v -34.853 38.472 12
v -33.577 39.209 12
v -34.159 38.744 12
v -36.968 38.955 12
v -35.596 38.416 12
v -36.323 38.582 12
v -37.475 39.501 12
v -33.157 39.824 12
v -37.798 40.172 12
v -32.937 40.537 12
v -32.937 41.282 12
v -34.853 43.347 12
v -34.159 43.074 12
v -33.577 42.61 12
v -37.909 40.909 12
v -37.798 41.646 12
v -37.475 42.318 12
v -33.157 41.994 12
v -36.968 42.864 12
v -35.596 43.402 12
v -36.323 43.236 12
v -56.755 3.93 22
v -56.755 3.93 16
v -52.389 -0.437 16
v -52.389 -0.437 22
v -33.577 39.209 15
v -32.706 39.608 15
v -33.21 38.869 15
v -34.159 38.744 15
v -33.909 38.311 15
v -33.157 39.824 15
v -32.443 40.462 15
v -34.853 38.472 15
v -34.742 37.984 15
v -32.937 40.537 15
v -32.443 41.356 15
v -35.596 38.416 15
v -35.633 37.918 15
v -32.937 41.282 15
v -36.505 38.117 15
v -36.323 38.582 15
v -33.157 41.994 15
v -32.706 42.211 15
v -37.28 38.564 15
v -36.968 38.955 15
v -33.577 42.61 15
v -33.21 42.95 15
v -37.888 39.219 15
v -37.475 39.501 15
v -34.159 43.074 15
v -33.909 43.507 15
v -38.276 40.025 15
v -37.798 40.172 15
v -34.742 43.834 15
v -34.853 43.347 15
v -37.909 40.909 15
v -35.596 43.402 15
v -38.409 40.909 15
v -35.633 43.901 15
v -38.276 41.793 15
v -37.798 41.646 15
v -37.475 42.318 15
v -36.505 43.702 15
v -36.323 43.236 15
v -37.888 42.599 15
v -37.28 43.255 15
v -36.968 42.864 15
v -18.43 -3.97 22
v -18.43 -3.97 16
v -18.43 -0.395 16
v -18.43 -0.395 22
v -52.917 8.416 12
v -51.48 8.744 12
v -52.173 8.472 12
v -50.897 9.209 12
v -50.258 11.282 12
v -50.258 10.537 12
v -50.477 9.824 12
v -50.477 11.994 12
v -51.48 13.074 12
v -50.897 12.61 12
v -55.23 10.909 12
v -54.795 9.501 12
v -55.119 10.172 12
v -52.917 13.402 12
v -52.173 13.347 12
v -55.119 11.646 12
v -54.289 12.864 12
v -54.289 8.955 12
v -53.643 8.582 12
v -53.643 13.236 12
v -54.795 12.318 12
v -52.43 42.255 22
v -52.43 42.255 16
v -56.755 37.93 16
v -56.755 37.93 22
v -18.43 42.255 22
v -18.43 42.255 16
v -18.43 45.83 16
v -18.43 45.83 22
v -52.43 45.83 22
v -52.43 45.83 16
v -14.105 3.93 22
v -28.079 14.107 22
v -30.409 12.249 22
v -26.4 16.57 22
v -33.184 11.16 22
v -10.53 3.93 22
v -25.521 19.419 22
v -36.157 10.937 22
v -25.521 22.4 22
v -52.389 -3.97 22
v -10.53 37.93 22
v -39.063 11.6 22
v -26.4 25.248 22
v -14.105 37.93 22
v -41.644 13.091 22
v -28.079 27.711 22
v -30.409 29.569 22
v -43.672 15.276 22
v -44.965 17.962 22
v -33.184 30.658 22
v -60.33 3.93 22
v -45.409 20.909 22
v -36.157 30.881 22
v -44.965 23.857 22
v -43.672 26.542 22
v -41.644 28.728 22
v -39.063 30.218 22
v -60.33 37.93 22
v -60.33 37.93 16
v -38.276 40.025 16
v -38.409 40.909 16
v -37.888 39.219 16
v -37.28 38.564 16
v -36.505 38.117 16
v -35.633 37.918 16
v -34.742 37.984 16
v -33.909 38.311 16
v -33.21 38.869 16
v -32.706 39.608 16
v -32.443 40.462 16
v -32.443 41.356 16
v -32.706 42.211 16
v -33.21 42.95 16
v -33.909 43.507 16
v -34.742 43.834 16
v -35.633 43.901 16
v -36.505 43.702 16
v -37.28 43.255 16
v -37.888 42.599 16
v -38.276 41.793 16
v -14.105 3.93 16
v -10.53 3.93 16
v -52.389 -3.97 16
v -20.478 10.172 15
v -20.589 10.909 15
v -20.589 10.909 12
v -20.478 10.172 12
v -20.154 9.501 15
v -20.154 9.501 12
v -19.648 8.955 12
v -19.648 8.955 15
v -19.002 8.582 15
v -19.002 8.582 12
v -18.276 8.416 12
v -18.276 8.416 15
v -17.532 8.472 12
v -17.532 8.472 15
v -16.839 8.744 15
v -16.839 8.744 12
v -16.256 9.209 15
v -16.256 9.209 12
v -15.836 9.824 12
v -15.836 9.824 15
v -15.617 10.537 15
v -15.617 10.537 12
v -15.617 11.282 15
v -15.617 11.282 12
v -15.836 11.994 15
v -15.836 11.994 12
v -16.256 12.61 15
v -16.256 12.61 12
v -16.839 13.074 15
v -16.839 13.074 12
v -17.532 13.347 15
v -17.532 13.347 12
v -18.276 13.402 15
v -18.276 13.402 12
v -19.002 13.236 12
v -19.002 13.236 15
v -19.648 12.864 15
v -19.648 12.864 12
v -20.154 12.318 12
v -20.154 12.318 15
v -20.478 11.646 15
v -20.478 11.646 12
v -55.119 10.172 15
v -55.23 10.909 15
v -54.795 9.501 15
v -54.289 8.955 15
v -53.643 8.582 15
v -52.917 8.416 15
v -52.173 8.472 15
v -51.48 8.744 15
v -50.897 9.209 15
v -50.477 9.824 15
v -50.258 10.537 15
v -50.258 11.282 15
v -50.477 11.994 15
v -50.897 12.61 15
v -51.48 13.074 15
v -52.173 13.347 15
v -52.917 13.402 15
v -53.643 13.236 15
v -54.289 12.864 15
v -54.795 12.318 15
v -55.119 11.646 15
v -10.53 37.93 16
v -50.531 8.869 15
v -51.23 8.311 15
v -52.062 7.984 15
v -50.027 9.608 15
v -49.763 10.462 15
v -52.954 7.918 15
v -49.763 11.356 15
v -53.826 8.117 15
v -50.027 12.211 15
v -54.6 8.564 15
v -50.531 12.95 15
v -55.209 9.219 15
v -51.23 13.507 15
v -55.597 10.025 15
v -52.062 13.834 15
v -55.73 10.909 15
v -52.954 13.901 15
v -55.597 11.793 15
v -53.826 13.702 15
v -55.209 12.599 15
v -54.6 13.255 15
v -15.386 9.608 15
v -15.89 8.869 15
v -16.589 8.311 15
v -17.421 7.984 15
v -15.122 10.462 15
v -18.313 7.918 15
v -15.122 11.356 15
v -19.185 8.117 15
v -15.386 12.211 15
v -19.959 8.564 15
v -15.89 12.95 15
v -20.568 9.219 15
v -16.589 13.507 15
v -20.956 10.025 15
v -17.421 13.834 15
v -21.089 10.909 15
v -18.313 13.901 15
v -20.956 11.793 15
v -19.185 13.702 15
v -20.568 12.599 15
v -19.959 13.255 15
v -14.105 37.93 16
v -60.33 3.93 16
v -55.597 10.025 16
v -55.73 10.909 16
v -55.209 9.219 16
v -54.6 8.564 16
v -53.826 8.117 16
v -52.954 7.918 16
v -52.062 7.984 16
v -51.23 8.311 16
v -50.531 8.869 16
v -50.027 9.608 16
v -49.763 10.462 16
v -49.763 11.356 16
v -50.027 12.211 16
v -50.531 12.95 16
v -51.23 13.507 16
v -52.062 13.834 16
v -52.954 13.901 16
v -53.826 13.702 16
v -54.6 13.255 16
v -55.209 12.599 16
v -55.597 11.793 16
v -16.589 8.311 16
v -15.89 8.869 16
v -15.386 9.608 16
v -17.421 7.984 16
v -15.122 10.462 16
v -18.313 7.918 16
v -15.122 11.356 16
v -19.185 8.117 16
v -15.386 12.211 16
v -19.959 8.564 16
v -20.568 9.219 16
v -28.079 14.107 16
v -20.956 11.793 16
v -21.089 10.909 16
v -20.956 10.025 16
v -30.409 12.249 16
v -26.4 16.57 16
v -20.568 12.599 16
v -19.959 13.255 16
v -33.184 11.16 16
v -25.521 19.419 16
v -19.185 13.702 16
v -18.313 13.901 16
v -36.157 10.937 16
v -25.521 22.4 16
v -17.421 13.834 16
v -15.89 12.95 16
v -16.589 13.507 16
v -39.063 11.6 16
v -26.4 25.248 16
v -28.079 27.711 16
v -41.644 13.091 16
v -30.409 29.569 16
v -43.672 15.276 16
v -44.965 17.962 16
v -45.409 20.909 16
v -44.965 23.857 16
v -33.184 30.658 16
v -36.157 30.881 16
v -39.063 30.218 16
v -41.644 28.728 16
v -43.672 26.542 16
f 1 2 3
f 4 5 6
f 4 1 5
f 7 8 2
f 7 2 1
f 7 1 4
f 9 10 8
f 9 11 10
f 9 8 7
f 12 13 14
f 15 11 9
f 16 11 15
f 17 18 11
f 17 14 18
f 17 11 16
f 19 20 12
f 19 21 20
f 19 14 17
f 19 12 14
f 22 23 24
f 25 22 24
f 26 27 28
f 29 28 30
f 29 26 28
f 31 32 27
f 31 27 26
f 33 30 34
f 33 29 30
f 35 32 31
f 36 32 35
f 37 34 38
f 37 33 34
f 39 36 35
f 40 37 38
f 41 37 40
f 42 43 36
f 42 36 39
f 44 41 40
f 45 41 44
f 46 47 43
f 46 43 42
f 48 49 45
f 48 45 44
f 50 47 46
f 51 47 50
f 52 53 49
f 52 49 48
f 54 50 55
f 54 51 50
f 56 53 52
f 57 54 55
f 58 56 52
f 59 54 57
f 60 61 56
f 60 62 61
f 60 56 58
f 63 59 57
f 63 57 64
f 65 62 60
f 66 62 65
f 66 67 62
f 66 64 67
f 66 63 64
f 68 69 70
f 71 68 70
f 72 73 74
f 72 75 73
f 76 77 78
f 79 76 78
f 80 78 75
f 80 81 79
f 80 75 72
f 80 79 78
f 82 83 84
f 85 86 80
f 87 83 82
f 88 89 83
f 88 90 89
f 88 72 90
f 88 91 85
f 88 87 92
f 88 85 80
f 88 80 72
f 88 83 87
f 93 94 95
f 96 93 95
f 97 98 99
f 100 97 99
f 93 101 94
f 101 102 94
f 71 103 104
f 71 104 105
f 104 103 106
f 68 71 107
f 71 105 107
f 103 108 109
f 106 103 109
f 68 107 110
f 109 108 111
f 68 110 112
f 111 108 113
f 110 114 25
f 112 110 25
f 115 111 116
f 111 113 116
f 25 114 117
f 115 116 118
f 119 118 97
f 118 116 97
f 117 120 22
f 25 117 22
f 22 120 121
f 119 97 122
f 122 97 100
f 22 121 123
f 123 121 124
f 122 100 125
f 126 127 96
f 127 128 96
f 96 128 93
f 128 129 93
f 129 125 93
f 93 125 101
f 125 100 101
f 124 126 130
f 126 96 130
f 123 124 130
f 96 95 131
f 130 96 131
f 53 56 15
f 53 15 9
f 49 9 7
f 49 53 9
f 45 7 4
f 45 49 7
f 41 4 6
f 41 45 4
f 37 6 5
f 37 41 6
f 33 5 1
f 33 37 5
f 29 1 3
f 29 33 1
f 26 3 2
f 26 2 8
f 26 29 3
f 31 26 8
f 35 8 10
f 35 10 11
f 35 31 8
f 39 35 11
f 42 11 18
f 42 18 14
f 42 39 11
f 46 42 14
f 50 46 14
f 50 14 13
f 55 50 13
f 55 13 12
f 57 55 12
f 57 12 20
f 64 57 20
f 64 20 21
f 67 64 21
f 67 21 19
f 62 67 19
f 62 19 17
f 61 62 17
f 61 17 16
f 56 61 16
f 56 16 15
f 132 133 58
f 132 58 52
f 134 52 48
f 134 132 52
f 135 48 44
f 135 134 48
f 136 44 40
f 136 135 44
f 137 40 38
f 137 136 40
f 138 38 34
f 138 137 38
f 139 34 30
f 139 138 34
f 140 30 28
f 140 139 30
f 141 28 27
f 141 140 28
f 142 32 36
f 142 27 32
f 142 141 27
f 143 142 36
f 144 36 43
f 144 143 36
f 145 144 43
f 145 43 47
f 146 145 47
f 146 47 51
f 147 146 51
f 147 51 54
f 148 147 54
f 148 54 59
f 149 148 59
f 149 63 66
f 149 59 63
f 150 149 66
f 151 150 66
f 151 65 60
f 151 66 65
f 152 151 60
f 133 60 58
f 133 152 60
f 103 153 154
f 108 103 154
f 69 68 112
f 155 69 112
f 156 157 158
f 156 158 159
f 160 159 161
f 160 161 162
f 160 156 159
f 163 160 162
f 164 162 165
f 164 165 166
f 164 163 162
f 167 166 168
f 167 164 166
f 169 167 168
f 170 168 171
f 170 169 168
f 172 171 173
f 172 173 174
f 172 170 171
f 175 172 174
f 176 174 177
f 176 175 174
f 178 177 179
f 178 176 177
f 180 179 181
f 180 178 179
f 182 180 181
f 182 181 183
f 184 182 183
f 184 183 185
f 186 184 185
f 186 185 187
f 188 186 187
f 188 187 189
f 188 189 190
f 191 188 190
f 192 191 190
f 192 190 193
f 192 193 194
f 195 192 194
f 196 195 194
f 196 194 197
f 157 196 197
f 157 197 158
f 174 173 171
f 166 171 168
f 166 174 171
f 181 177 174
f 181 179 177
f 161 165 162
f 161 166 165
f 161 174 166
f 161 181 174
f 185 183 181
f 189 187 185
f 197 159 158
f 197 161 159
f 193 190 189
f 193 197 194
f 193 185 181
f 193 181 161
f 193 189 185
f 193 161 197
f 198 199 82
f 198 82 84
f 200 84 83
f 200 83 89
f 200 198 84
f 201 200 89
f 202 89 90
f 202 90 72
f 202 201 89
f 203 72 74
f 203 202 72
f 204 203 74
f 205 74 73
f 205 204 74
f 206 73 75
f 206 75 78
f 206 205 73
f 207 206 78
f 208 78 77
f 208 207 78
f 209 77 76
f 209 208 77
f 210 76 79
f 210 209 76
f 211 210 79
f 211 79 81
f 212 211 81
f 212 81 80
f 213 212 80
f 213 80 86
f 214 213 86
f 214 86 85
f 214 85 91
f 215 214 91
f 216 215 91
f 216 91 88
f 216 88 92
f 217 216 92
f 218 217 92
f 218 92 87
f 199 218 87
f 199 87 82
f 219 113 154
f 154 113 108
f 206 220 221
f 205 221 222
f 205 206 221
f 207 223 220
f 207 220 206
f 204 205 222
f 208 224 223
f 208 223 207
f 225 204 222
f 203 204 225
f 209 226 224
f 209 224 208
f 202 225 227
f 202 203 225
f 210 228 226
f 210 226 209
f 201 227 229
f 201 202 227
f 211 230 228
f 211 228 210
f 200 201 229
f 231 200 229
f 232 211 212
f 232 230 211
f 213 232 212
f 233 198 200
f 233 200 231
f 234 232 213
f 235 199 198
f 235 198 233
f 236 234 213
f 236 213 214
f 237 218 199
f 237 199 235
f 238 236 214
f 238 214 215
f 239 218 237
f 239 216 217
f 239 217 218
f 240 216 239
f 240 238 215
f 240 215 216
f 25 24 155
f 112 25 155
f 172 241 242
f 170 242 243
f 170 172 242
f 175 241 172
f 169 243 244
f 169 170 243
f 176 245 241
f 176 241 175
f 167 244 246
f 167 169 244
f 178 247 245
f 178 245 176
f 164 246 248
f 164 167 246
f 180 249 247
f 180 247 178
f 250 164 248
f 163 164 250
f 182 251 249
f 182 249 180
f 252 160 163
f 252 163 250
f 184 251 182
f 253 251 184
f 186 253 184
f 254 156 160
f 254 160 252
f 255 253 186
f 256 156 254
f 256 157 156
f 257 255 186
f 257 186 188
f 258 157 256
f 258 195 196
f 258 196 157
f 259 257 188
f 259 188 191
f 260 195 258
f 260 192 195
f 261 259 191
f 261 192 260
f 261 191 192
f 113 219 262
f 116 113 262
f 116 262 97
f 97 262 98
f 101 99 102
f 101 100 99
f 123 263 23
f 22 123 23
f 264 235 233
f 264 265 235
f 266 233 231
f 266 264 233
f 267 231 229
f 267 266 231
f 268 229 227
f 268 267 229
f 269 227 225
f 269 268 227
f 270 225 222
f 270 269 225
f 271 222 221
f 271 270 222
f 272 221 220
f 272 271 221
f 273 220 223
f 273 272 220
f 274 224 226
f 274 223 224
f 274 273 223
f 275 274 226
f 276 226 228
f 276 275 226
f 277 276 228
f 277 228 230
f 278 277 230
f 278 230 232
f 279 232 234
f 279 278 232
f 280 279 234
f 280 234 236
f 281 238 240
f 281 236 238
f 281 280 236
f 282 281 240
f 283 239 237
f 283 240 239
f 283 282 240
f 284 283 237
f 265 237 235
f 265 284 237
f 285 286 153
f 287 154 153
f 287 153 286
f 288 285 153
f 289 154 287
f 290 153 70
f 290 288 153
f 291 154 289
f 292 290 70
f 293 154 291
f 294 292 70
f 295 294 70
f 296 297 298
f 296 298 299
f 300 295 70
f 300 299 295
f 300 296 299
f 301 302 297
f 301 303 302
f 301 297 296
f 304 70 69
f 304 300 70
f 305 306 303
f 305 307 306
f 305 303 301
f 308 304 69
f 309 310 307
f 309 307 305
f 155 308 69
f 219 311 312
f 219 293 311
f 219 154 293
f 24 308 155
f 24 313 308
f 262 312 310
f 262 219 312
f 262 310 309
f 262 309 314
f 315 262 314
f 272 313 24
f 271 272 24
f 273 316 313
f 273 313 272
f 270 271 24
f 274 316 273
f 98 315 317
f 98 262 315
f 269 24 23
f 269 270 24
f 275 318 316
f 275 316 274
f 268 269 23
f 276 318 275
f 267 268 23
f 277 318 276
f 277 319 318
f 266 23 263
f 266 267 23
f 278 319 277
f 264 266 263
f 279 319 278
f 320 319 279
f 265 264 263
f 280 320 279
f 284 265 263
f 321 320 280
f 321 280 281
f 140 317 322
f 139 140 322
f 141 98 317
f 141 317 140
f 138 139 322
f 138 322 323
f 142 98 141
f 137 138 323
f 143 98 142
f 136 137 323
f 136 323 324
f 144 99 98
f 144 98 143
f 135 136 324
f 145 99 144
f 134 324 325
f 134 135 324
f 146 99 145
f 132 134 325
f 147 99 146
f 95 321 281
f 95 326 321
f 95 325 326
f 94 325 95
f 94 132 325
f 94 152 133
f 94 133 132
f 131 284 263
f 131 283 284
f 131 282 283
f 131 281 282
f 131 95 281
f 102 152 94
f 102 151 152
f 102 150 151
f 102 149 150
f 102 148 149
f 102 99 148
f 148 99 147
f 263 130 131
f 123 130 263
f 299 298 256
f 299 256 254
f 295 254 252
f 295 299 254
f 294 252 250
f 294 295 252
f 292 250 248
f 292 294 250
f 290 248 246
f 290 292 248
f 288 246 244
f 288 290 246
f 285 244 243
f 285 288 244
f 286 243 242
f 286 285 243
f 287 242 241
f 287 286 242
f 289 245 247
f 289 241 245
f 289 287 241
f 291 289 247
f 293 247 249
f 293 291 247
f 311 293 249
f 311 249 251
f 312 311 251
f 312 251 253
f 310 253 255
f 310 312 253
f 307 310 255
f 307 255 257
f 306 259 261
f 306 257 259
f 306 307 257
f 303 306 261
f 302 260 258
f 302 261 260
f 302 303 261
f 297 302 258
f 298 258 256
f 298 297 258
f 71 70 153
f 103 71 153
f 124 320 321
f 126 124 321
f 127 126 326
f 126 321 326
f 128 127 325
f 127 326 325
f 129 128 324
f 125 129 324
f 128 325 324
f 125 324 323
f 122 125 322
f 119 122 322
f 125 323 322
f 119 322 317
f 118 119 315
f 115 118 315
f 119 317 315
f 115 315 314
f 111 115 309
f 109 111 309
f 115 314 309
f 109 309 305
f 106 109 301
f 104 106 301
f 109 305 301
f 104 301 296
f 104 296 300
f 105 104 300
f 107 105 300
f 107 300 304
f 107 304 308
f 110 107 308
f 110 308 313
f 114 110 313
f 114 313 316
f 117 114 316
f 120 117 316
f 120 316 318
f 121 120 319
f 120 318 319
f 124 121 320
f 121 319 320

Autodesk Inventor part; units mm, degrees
ref_plane "YZ Plane" through (0, 0, 0) normal (1, 0, 0) x (0, 1, 0)
ref_plane "XZ Plane" through (0, 0, 0) normal (0, 1, 0) x (-1, 0, 0)
ref_plane "Work Plane1" through (-56.3599, 0, 22) normal (0, 0, -1) x (-1, 0, 0)
sketch "Sketch1" plane through (-56.3599, 0, 22) normal (0, 0, -1) x (-1, 0, 0)
  line L0 (-4.0299, -0.3538) -> (-2.2322, 1.4439) construction
  arc A0 (-1.4439, 2.2322) -> (-2.2322, 1.4439) centre (-0.9299, 0.9299) ccw construction
  line L1 (-1.4439, 2.2322) -> (0.3538, 4.0299) construction
  line L2 (-37.8299, 42.8299) -> (-37.8299, 37.8299) construction
  line L3 (-37.8299, 37.8299) -> (-42.9208, 37.8299) construction
  line L4 (-37.8299, 42.2137) -> (-37.8299, 45.8299) construction
  line L5 (-37.8299, 45.8299) -> (-4.0299, 45.8299) construction
  line L6 (-4.0299, 45.8299) -> (-4.0299, 42.2137) construction
  line L7 (-4.0299, 4.0299) -> (0.3538, 4.0299) projected
  circle A1 centre (-20.9299, 20.9299) radius 17.5 projected
  line L8 (-20.9299, 58.9723) -> (17.1124, 20.9299) construction
  line L9 (17.1124, 20.9299) -> (-20.9299, -17.1124) construction
  line L10 (-20.9299, -17.1124) -> (-58.9723, 20.9299) construction
  line L11 (-58.9723, 20.9299) -> (-20.9299, 58.9723) construction
  line L12 (-20.9299, 58.9723) -> (-20.9299, -17.1124) construction
  line L13 (17.1124, 20.9299) -> (-58.9723, 20.9299) construction
  line L14 (-20.9299, 58.9723) -> (32.8701, 58.9723) construction
  line L15 (-43.4299, 43.4299) -> (1.5701, 43.4299) construction
  line L16 (1.5701, 43.4299) -> (1.5701, -1.5701) construction
  line L17 (1.5701, -1.5701) -> (-43.4299, -1.5701) construction
  line L18 (-43.4299, -1.5701) -> (-43.4299, 43.4299) construction
  line L19 (-43.4299, 43.4299) -> (1.5701, -1.5701) construction
  line L20 (1.5701, 43.4299) -> (-43.4299, -1.5701) construction
  line L21 (-43.4299, 5.3876) -> (-43.4299, 36.4723)
  line L22 (-43.4299, 36.4723) -> (-36.4723, 43.4299)
  line L23 (-36.4723, 43.4299) -> (-5.3876, 43.4299)
  line L24 (-5.3876, 43.4299) -> (1.5701, 36.4723)
  line L25 (1.5701, 36.4723) -> (1.5701, 5.3876)
  line L26 (1.5701, 5.3876) -> (-5.3876, -1.5701)
  line L27 (-5.3876, -1.5701) -> (-36.4723, -1.5701)
  line L28 (-36.4723, -1.5701) -> (-43.4299, 5.3876)
  line L29 (-4.0299, 42.2137) -> (-37.8299, 42.2137) projected
  line L30 (-4.0299, -0.3538) -> (-4.0299, 4.0299) projected
  circle A2 centre (-20.9299, 20.9299) radius 1.5
  line L31 (-10.9299, 10.9299) -> (-30.9299, 10.9299) construction
  line L32 (-30.9299, 10.9299) -> (-30.9299, 30.9299) construction
  line L33 (-30.9299, 30.9299) -> (-10.9299, 30.9299) construction
  line L34 (-10.9299, 30.9299) -> (-10.9299, 10.9299) construction
  line L35 (-10.9299, 10.9299) -> (-30.9299, 30.9299) construction
  line L36 (-30.9299, 10.9299) -> (-10.9299, 30.9299) construction
  circle A3 centre (-30.9299, 30.9299) radius 1.4
  circle A4 centre (-30.9299, 10.9299) radius 1.4
  circle A5 centre (-10.9299, 10.9299) radius 1.4
  line L37 (-45.8299, 37.8299) -> (-42.0723, 37.8299) construction
  line L38 (-42.1723, 37.7299) -> (-45.8299, 37.7299)
  line L39 (-45.8299, 37.7299) -> (-45.8299, 4.1299)
  line L40 (-45.8299, 4.1299) -> (-42.1723, 4.1299)
  line L41 (-42.1723, 4.1299) -> (-42.1723, 37.7299)
  line L42 (-45.8299, 4.0299) -> (-42.0723, 4.0299) construction
  line L43 (-45.8299, 37.8299) -> (-42.0723, 37.8299) projected
  line L44 (-37.7299, 45.8299) -> (-4.1299, 45.8299)
  line L45 (-4.1299, 45.8299) -> (-4.1299, 42.1723)
  line L46 (-4.1299, 42.1723) -> (-37.7299, 42.1723)
  line L47 (-37.7299, 42.1723) -> (-37.7299, 45.8299)
  line L48 (0.4701, 37.8299) -> (0.4701, 4.0299) construction
  line L49 (0.4701, 4.0299) -> (3.9701, 4.0299) construction
  line L50 (3.9701, 37.8299) -> (3.9701, 4.0299) construction
  line L51 (0.4701, 37.8299) -> (3.9701, 37.8299) construction
  line L52 (-45.8299, -3.9701) -> (-4.0299, -3.9701) construction
  line L53 (0.3124, 37.7299) -> (3.9701, 37.7299)
  line L54 (3.9701, 37.7299) -> (3.9701, 4.1299)
  line L55 (3.9701, 4.1299) -> (0.3124, 4.1299)
  line L56 (0.3124, 4.1299) -> (0.3124, 37.7299)
  line L57 (-4.1713, -0.3538) -> (-37.7299, -0.3538)
  line L58 (-37.7299, -0.3538) -> (-37.7299, -3.9701)
  line L59 (-37.7299, -3.9701) -> (-4.1713, -3.9701)
  line L60 (-4.1713, -3.9701) -> (-4.1713, -0.3538)
  point P0 (-37.8299, 4.0299)
  dimension "d18" = 53.8
  dimension "d19" = 45
  dimension "d20" = 53.8
  dimension "d21" = 45
  dimension "d22" = 45
  dimension "d30" = 20
  dimension "d31" = 20
  dimension "d32" = 2.8
  dimension "d33" = 2.8
  dimension "d34" = 2.8
  dimension "d35" = 3
  dimension "d36" = 0.1
  dimension "d37" = 0.1
  dimension "d38" = 0.1
  dimension "d39" = 0.1
extrude "Extrusion1" add sketch "Sketch1" along normal blind 6 contours L30 L26 L57 L28 L41 L22 L46 L24 L56 L7 | L7 L26 L30 | L56 L24 L25 L26 | L26 L25 L24 L53 L54 L55 | L60 L59 L58 L57 L28 L27 L26 | L26 L27 L28 L57 | L46 L22 L29 L24 | L24 L29 L45 | L40 L39 L38 L22 L21 L28 | L28 L21 L22 L41 | L29 L22 L23 L24 | L24 L23 L22 L29 L47 L44 L45 | L47 L29 L22 | A1 | A2 | A3 | A4 | A5
sketch "Skizze4" plane through (-56.3599, 0, 16) normal (0, 0, -1) x (-1, 0, 0)
  line L0 (-37.7299, 42.1723) -> (-42.1723, 37.7299) projected
  line L1 (-42.1723, 37.7299) -> (-45.8299, 37.7299) projected
  line L2 (-45.8299, 37.7299) -> (-45.8299, 4.1299) construction
  line L3 (-45.8299, 4.1299) -> (-42.1723, 4.1299) projected
  line L4 (-42.1723, 4.1299) -> (-37.6885, -0.3538) projected
  line L5 (-37.6885, -0.3538) -> (-37.7299, -0.3538) projected
  line L6 (-37.7299, -0.3538) -> (-37.7299, -3.9701) projected
  line L7 (-37.7299, -3.9701) -> (-4.1713, -3.9701) construction
  line L8 (-4.1713, -3.9701) -> (-4.1713, -0.3538) projected
  line L9 (-4.1713, -0.3538) -> (0.3124, 4.1299) projected
  line L10 (0.3124, 4.1299) -> (3.9701, 4.1299) projected
  line L11 (3.9701, 4.1299) -> (3.9701, 37.7299) construction
  line L12 (3.9701, 37.7299) -> (0.3124, 37.7299) projected
  line L13 (0.3124, 37.7299) -> (-4.1299, 42.1723) projected
  line L14 (-4.1299, 42.1723) -> (-4.1299, 45.8299) projected
  line L15 (-4.1299, 45.8299) -> (-37.7299, 45.8299) construction
  line L16 (-37.7299, 45.8299) -> (-37.7299, 42.1723) projected
  line L17 (-37.9299, 46.0299) -> (-3.9299, 46.0299) construction
  line L18 (-3.9299, 46.0299) -> (-3.9299, 42.2551)
  line L19 (-3.9299, 42.2551) -> (0.3953, 37.9299)
  line L20 (0.3953, 37.9299) -> (4.1701, 37.9299)
  line L21 (4.1701, 37.9299) -> (4.1701, 3.9299) construction
  line L22 (4.1701, 3.9299) -> (0.3953, 3.9299)
  line L23 (0.3953, 3.9299) -> (-3.9713, -0.4367)
  line L24 (-3.9713, -0.4367) -> (-3.9713, -4.1701)
  line L25 (-3.9713, -4.1701) -> (-37.9299, -4.1701) construction
  line L26 (-37.9299, -4.1701) -> (-37.9299, -0.3953)
  line L27 (-37.9299, -0.3953) -> (-42.2551, 3.9299)
  line L28 (-42.2551, 3.9299) -> (-46.0299, 3.9299)
  line L29 (-46.0299, 3.9299) -> (-46.0299, 37.9299) construction
  line L30 (-46.0299, 37.9299) -> (-42.2551, 37.9299)
  line L31 (-42.2551, 37.9299) -> (-37.9299, 42.2551)
  line L32 (-37.9299, 42.2551) -> (-37.9299, 46.0299)
  line L33 (-45.8299, 37.7299) -> (-45.8299, 37.9299)
  line L34 (-4.1299, 45.8299) -> (-37.7299, 45.8299) projected
  line L35 (-37.7299, 45.8299) -> (-37.9299, 45.8299)
  line L36 (-4.1299, 45.8299) -> (-3.9299, 45.8299)
  line L37 (3.9701, 37.7299) -> (3.9701, 37.9299)
  line L38 (3.9701, 4.1299) -> (3.9701, 37.7299) projected
  line L39 (3.9701, 4.1299) -> (3.9701, 3.9299)
  line L40 (-4.1713, -3.9701) -> (-3.9713, -3.9701)
  line L41 (-37.7299, -3.9701) -> (-37.9299, -3.9701)
  line L42 (-45.8299, 4.1299) -> (-45.8299, 3.9299)
  point P0 (-56.3599, 0)
  dimension "d40" = 0.2
extrude "IM_offset" add sketch "Skizze4" against normal up to surface (6 mm away)
ref_plane "Arbeitsebene5" through (-35.4299, 3.9299, 22) normal (-1, 0, 0) x (0, 0, 1)
ref_plane "Arbeitsebene6" through (-18.4299, 20.9299, 22) normal (0, 1, 0) x (-1, 0, 0)
sketch "Skizze31" plane through (-56.3599, 0, 16) normal (0, 0, -1) x (-1, 0, 0)
  line L0 (3.9701, 3.9299) -> (3.9701, 37.9299) projected
  line L1 (3.9701, 37.9299) -> (0.3953, 37.9299) projected
  line L2 (0.3953, 37.9299) -> (-3.9299, 42.2551) projected
  line L3 (-3.9299, 42.2551) -> (-3.9299, 45.8299) projected
  line L4 (-3.9299, 45.8299) -> (-37.9299, 45.8299) projected
  line L5 (-37.9299, 45.8299) -> (-37.9299, 42.2551) projected
  line L6 (-37.9299, 42.2551) -> (-42.2551, 37.9299) projected
  line L7 (-42.2551, 37.9299) -> (-45.8299, 37.9299) projected
  line L8 (-45.8299, 37.9299) -> (-45.8299, 3.9299) projected
  line L9 (-42.2551, 3.9299) -> (-45.8299, 3.9299) projected
  line L10 (-37.9299, -0.3953) -> (-42.2551, 3.9299) projected
  line L11 (-37.9299, -3.9701) -> (-37.9299, -0.3953) projected
  line L12 (-3.9713, -3.9701) -> (-37.9299, -3.9701) projected
  line L13 (-3.9713, -3.9701) -> (-3.9713, -0.4367) projected
  line L14 (-3.9713, -0.4367) -> (0.3953, 3.9299) projected
  line L15 (0.3953, 3.9299) -> (3.9701, 3.9299) projected
  circle A0 centre (-20.9506, 20.9092) radius 10
  point P0 (-56.3599, 0)
  dimension "d181" = 20
extrude "Extrusion26" cut sketch "Skizze31" against normal blind 10 contours A0
sketch "Skizze32" plane through (-56.3599, 0, 16) normal (0, 0, -1) x (-1, 0, 0)
  circle A0 centre (-20.9506, 20.9092) radius 10 projected
  circle A1 centre (-20.9506, 20.9092) radius 15
  line L0 (-3.6301, 10.9092) -> (-38.2711, 10.9092)
  line L1 (-38.2711, 10.9092) -> (-20.9506, 40.9092)
  line L2 (-20.9506, 40.9092) -> (-3.6301, 10.9092)
  line L3 (-3.9713, -3.9701) -> (-37.9299, -3.9701) projected
  circle A2 centre (-3.6301, 10.9092) radius 2.5
  circle A3 centre (-38.2711, 10.9092) radius 2.5
  circle A4 centre (-20.9506, 40.9092) radius 2.5
  circle A5 centre (-3.6301, 10.9092) radius 4 construction
  circle A6 centre (-38.2711, 10.9092) radius 4 construction
  circle A7 centre (-20.9506, 40.9092) radius 4 construction
  point P0 (-56.3599, 0)
  dimension "d184" = 30
  dimension "d185" = 10
  dimension "d186" = 5
  dimension "d187" = 5
  dimension "d188" = 5
  dimension "d189" = 8
  dimension "d190" = 8
  dimension "d191" = 8
extrude "Extrusion27" add sketch "Skizze32" along normal blind 4 contours A4 L1 L2 | L2 L1 A4 | A2 L0 L2 | L2 L0 A2 | A3 L1 L0 | L0 L1 A3
sketch "Skizze33" plane through (-56.3599, 0, 16) normal (0, 0, -1) x (-1, 0, 0)
  circle A0 centre (-38.2711, 10.9092) radius 2.5 projected
  circle A1 centre (-3.6301, 10.9092) radius 2.5 projected
  circle A2 centre (-20.9506, 40.9092) radius 2.5 projected
  circle A3 centre (-20.9506, 20.9092) radius 10 projected
  line L0 (3.9701, 3.9299) -> (3.9701, 37.9299) projected
  line L1 (3.9701, 37.9299) -> (0.3953, 37.9299) projected
  line L2 (0.3953, 37.9299) -> (-3.9299, 42.2551) projected
  line L3 (-3.9299, 42.2551) -> (-3.9299, 45.8299) projected
  line L4 (-3.9299, 45.8299) -> (-37.9299, 45.8299) projected
  line L5 (-37.9299, 45.8299) -> (-37.9299, 42.2551) projected
  line L6 (-37.9299, 42.2551) -> (-42.2551, 37.9299) projected
  line L7 (-42.2551, 37.9299) -> (-45.8299, 37.9299) projected
  line L8 (-45.8299, 37.9299) -> (-45.8299, 3.9299) projected
  line L9 (-42.2551, 3.9299) -> (-45.8299, 3.9299) projected
  line L10 (-37.9299, -0.3953) -> (-42.2551, 3.9299) projected
  line L11 (-37.9299, -3.9701) -> (-37.9299, -0.3953) projected
  line L12 (-3.9713, -3.9701) -> (-37.9299, -3.9701) projected
  line L13 (-3.9713, -3.9701) -> (-3.9713, -0.4367) projected
  line L14 (-3.9713, -0.4367) -> (0.3953, 3.9299) projected
  line L15 (0.3953, 3.9299) -> (3.9701, 3.9299) projected
  circle A4 centre (-20.9506, 40.9092) radius 3
  circle A5 centre (-3.6301, 10.9092) radius 3
  circle A6 centre (-38.2711, 10.9092) radius 3
  point P0 (-56.3599, 0)
  dimension "d194" = 0.5
  dimension "d195" = 0.5
  dimension "d196" = 0.5
extrude "Extrusion28" add sketch "Skizze33" along normal blind 1 contours A0 | A1 | A4 | A5 | A6
properties part number "20_Cube_Insert_rotational_filtermount_v3.iam"
